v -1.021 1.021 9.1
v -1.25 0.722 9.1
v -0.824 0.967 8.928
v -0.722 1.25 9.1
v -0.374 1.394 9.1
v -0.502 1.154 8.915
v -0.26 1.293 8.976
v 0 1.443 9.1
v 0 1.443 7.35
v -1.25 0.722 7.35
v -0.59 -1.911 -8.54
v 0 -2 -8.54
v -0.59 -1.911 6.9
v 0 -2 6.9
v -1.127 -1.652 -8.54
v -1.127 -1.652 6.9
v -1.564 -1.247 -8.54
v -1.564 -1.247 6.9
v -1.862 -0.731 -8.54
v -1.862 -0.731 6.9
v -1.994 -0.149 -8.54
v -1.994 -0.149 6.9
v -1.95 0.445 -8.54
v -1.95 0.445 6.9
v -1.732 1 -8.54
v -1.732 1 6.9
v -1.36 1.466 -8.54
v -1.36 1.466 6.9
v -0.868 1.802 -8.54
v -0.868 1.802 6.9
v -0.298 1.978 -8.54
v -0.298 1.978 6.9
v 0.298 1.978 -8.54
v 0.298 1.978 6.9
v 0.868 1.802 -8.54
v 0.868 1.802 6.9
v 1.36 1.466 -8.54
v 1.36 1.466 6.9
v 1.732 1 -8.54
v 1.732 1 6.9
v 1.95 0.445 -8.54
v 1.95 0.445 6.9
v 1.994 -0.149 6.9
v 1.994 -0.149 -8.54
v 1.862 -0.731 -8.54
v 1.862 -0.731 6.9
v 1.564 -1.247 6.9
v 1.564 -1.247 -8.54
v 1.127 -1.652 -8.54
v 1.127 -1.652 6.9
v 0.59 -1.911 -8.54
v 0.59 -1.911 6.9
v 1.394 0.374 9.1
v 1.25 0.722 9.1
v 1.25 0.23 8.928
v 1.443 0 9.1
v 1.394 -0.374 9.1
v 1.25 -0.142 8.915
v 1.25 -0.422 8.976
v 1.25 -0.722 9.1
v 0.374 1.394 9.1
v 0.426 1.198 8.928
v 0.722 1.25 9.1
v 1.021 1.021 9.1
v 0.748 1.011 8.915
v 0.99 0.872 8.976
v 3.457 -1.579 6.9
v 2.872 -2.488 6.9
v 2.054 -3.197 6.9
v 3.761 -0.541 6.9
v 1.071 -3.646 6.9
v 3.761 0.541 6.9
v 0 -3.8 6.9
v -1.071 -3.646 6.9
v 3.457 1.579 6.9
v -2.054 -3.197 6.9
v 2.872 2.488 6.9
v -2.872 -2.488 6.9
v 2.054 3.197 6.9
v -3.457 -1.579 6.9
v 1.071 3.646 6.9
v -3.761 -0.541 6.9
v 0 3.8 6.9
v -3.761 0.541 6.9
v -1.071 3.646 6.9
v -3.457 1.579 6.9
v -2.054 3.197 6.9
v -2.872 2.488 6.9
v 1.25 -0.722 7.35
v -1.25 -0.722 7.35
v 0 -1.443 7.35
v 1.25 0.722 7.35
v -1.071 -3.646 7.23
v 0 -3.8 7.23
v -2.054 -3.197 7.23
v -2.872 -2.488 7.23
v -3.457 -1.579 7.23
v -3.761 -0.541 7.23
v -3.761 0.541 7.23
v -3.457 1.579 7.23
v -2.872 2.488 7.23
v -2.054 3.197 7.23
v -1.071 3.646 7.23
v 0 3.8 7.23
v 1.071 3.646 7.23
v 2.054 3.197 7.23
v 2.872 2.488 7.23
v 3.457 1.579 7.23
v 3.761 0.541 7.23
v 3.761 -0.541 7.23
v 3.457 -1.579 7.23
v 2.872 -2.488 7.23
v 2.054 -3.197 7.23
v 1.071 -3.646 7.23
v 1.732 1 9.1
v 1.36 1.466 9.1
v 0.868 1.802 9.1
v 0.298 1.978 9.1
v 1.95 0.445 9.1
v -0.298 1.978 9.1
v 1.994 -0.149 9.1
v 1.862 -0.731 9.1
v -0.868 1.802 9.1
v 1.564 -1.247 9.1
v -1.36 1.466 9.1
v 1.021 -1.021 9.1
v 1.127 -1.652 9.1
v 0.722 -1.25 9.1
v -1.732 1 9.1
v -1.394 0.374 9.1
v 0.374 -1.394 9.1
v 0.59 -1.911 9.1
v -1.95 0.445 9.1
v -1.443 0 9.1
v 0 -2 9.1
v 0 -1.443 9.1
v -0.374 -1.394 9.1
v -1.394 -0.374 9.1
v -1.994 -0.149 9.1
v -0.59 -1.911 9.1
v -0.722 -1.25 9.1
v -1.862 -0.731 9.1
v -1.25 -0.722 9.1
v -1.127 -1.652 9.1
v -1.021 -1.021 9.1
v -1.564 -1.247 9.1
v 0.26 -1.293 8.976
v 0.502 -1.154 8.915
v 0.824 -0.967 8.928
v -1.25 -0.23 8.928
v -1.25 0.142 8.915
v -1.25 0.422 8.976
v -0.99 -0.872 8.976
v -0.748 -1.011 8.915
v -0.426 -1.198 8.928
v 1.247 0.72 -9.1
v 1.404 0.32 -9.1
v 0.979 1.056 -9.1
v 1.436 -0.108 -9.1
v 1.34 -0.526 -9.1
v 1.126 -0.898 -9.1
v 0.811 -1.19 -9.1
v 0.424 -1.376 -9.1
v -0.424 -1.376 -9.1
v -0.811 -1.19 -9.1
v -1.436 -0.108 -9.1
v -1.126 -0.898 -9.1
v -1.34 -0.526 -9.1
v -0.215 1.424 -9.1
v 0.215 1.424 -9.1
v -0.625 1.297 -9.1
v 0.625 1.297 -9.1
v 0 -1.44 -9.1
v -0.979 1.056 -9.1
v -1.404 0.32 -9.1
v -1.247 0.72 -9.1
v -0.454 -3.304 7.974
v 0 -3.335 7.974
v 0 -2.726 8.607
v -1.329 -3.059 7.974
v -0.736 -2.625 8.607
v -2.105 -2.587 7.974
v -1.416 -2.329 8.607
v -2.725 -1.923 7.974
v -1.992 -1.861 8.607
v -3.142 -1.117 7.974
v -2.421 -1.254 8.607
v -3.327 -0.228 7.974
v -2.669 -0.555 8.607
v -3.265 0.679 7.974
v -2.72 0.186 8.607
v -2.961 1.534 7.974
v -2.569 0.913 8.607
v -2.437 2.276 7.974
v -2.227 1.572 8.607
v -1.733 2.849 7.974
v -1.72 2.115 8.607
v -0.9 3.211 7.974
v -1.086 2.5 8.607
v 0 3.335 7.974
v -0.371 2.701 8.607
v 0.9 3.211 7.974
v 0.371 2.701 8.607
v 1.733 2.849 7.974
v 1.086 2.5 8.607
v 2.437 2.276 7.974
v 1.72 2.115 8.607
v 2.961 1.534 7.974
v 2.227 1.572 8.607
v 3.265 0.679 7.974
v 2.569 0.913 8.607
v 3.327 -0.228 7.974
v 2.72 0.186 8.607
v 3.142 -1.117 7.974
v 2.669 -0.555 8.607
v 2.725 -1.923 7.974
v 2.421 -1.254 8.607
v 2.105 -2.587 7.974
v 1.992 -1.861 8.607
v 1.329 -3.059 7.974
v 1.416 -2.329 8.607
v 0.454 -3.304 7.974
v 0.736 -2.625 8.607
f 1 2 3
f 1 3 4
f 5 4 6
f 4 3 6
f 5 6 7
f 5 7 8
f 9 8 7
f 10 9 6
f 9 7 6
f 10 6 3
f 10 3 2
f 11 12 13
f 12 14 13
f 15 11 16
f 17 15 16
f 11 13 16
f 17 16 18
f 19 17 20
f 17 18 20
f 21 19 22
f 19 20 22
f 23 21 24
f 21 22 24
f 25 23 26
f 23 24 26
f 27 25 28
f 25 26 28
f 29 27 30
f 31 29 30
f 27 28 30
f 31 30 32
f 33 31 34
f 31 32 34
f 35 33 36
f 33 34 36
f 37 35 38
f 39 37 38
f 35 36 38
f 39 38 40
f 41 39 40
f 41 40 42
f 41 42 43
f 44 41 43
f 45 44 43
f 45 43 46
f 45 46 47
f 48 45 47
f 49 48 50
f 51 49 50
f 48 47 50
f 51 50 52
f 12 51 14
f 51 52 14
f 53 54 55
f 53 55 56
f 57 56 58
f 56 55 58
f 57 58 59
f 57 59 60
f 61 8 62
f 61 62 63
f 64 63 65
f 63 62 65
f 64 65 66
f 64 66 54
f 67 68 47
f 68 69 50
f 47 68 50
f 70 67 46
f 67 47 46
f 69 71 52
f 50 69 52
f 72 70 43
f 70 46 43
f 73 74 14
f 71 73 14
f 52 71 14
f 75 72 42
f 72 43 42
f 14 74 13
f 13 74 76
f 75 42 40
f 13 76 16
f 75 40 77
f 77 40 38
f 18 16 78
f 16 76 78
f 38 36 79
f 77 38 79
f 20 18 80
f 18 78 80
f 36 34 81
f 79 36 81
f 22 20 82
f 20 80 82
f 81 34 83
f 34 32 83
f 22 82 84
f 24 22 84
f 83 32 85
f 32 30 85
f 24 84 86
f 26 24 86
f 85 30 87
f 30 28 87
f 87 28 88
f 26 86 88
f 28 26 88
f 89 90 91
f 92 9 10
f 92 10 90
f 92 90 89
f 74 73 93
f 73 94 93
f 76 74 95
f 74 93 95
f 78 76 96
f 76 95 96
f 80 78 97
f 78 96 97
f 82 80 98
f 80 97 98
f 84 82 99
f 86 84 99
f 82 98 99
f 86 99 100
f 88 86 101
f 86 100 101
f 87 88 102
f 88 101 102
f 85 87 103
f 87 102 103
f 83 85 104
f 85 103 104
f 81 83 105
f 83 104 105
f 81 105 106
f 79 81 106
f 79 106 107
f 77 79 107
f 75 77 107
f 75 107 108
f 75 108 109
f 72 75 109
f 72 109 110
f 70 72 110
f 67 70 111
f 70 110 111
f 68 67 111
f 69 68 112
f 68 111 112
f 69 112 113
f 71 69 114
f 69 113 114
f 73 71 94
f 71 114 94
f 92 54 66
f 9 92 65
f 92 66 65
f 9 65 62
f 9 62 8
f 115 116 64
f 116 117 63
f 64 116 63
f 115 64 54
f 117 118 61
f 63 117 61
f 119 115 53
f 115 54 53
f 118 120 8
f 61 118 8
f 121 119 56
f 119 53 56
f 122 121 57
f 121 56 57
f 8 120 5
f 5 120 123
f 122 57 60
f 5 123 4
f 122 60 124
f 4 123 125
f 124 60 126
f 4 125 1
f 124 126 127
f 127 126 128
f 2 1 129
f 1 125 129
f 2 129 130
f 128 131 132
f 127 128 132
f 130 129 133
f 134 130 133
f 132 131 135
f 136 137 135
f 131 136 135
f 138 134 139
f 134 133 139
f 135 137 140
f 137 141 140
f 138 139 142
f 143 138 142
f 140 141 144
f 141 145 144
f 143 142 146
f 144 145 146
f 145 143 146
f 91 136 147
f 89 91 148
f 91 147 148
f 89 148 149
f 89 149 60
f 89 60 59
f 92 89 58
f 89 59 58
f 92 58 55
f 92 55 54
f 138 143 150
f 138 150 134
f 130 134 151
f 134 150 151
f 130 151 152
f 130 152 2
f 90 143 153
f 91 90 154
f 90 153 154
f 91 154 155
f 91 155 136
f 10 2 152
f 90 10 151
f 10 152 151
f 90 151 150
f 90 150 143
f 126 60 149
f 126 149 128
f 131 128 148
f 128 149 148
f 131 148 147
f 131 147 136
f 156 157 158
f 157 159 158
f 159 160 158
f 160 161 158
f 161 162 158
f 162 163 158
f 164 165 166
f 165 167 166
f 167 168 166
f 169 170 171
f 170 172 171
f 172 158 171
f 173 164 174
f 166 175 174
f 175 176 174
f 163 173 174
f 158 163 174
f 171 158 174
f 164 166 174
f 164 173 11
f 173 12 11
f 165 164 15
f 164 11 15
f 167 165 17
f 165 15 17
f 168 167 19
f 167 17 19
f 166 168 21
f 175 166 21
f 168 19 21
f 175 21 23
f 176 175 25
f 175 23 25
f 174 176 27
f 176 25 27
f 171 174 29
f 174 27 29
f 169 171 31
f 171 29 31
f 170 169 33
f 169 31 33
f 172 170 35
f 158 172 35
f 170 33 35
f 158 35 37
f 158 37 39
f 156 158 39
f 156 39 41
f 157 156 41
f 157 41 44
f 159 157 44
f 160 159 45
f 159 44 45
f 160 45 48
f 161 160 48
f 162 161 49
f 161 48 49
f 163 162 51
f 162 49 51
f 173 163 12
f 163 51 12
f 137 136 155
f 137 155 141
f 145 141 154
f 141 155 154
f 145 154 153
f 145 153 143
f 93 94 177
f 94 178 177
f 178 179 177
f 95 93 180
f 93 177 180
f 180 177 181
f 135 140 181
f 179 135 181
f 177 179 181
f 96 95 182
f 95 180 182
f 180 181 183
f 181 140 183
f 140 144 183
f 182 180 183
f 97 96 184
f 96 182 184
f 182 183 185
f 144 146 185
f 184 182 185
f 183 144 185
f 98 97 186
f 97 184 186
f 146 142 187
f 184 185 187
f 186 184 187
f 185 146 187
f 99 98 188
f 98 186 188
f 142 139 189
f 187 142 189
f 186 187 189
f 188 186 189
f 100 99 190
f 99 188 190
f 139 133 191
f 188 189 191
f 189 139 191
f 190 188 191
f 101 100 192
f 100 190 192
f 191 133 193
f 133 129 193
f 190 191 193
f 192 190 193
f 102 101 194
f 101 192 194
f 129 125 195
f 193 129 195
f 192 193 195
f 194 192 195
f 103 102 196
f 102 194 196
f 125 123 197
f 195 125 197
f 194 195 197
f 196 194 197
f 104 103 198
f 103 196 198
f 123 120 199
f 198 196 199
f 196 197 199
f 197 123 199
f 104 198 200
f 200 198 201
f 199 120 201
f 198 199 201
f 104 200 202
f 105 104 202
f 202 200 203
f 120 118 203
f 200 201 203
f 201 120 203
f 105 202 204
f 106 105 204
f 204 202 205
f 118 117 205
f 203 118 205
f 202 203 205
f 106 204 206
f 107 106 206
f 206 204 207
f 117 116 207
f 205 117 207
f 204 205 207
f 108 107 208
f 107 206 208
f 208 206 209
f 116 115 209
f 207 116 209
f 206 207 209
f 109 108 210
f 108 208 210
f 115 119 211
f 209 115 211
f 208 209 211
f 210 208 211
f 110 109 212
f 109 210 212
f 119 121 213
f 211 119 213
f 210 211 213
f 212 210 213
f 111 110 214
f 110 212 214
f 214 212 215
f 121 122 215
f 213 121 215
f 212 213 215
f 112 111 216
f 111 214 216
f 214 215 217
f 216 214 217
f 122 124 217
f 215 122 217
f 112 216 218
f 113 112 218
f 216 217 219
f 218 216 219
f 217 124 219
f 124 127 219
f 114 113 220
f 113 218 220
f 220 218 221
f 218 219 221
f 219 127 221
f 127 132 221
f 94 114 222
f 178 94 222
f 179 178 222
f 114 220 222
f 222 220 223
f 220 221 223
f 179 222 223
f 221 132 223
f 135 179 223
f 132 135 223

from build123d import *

# Parameters (mm, degrees)
CUT_EXTRUDE1_DEPTH = 1.75


with BuildPart() as part:
    # Sketch2 → Revolve1 (revolve)
    with BuildSketch(Plane(origin=(0, 0, 0), x_dir=(0, 0, -1), z_dir=(1, 0, 0)), mode=Mode.PRIVATE) as revolve1_sk:
        with BuildLine():
            Line((-9.1, 0), (9.1, 0))
            Line((9.1, 0), (9.1, 1.44))
            Line((9.1, 1.44), (8.54, 2))
            Line((8.54, 2), (-6.9, 2))
            Line((-6.9, 2), (-6.9, 3.8))
            Line((-6.9, 3.8), (-7.23, 3.8))
            ThreePointArc((-7.23, 3.8), (-8.306499853, 3.047002626), (-9.1, 2))
            Line((-9.1, 2), (-9.1, 0))
        make_face()
    revolve(revolve1_sk.sketch.rotate(Axis((0, 0, 9.1), (0, 0, -1)), 180), axis=Axis((0, 0, 9.1), (0, 0, -1)))

    # Sketch3 → Cut-Extrude1 (cut)
    with BuildSketch(Plane.XY.offset(9.1)):
        Polygon((0, 1.443375673), (-1.25, 0.721687836), (-1.25, -0.721687836), (0, -1.443375673), (1.25, -0.721687836), (1.25, 0.721687836), align=None)
    extrude(amount=-CUT_EXTRUDE1_DEPTH, mode=Mode.SUBTRACT)

    # Cut-Extrude2 cone 1 section (through the dimple's axis) → Cut-Extrude2 (revolve, cut)
    with BuildSketch(Plane(origin=(0, 0, 9.1), x_dir=(0, -1, 0), z_dir=(1, 0, 0))):
        Polygon((0, 0), (1.443375673, 0), (0, 1.443375673), align=None)
    revolve(axis=Axis((0, 0, 9.1), (0, 0, -1)), mode=Mode.SUBTRACT)


solid = part.part
